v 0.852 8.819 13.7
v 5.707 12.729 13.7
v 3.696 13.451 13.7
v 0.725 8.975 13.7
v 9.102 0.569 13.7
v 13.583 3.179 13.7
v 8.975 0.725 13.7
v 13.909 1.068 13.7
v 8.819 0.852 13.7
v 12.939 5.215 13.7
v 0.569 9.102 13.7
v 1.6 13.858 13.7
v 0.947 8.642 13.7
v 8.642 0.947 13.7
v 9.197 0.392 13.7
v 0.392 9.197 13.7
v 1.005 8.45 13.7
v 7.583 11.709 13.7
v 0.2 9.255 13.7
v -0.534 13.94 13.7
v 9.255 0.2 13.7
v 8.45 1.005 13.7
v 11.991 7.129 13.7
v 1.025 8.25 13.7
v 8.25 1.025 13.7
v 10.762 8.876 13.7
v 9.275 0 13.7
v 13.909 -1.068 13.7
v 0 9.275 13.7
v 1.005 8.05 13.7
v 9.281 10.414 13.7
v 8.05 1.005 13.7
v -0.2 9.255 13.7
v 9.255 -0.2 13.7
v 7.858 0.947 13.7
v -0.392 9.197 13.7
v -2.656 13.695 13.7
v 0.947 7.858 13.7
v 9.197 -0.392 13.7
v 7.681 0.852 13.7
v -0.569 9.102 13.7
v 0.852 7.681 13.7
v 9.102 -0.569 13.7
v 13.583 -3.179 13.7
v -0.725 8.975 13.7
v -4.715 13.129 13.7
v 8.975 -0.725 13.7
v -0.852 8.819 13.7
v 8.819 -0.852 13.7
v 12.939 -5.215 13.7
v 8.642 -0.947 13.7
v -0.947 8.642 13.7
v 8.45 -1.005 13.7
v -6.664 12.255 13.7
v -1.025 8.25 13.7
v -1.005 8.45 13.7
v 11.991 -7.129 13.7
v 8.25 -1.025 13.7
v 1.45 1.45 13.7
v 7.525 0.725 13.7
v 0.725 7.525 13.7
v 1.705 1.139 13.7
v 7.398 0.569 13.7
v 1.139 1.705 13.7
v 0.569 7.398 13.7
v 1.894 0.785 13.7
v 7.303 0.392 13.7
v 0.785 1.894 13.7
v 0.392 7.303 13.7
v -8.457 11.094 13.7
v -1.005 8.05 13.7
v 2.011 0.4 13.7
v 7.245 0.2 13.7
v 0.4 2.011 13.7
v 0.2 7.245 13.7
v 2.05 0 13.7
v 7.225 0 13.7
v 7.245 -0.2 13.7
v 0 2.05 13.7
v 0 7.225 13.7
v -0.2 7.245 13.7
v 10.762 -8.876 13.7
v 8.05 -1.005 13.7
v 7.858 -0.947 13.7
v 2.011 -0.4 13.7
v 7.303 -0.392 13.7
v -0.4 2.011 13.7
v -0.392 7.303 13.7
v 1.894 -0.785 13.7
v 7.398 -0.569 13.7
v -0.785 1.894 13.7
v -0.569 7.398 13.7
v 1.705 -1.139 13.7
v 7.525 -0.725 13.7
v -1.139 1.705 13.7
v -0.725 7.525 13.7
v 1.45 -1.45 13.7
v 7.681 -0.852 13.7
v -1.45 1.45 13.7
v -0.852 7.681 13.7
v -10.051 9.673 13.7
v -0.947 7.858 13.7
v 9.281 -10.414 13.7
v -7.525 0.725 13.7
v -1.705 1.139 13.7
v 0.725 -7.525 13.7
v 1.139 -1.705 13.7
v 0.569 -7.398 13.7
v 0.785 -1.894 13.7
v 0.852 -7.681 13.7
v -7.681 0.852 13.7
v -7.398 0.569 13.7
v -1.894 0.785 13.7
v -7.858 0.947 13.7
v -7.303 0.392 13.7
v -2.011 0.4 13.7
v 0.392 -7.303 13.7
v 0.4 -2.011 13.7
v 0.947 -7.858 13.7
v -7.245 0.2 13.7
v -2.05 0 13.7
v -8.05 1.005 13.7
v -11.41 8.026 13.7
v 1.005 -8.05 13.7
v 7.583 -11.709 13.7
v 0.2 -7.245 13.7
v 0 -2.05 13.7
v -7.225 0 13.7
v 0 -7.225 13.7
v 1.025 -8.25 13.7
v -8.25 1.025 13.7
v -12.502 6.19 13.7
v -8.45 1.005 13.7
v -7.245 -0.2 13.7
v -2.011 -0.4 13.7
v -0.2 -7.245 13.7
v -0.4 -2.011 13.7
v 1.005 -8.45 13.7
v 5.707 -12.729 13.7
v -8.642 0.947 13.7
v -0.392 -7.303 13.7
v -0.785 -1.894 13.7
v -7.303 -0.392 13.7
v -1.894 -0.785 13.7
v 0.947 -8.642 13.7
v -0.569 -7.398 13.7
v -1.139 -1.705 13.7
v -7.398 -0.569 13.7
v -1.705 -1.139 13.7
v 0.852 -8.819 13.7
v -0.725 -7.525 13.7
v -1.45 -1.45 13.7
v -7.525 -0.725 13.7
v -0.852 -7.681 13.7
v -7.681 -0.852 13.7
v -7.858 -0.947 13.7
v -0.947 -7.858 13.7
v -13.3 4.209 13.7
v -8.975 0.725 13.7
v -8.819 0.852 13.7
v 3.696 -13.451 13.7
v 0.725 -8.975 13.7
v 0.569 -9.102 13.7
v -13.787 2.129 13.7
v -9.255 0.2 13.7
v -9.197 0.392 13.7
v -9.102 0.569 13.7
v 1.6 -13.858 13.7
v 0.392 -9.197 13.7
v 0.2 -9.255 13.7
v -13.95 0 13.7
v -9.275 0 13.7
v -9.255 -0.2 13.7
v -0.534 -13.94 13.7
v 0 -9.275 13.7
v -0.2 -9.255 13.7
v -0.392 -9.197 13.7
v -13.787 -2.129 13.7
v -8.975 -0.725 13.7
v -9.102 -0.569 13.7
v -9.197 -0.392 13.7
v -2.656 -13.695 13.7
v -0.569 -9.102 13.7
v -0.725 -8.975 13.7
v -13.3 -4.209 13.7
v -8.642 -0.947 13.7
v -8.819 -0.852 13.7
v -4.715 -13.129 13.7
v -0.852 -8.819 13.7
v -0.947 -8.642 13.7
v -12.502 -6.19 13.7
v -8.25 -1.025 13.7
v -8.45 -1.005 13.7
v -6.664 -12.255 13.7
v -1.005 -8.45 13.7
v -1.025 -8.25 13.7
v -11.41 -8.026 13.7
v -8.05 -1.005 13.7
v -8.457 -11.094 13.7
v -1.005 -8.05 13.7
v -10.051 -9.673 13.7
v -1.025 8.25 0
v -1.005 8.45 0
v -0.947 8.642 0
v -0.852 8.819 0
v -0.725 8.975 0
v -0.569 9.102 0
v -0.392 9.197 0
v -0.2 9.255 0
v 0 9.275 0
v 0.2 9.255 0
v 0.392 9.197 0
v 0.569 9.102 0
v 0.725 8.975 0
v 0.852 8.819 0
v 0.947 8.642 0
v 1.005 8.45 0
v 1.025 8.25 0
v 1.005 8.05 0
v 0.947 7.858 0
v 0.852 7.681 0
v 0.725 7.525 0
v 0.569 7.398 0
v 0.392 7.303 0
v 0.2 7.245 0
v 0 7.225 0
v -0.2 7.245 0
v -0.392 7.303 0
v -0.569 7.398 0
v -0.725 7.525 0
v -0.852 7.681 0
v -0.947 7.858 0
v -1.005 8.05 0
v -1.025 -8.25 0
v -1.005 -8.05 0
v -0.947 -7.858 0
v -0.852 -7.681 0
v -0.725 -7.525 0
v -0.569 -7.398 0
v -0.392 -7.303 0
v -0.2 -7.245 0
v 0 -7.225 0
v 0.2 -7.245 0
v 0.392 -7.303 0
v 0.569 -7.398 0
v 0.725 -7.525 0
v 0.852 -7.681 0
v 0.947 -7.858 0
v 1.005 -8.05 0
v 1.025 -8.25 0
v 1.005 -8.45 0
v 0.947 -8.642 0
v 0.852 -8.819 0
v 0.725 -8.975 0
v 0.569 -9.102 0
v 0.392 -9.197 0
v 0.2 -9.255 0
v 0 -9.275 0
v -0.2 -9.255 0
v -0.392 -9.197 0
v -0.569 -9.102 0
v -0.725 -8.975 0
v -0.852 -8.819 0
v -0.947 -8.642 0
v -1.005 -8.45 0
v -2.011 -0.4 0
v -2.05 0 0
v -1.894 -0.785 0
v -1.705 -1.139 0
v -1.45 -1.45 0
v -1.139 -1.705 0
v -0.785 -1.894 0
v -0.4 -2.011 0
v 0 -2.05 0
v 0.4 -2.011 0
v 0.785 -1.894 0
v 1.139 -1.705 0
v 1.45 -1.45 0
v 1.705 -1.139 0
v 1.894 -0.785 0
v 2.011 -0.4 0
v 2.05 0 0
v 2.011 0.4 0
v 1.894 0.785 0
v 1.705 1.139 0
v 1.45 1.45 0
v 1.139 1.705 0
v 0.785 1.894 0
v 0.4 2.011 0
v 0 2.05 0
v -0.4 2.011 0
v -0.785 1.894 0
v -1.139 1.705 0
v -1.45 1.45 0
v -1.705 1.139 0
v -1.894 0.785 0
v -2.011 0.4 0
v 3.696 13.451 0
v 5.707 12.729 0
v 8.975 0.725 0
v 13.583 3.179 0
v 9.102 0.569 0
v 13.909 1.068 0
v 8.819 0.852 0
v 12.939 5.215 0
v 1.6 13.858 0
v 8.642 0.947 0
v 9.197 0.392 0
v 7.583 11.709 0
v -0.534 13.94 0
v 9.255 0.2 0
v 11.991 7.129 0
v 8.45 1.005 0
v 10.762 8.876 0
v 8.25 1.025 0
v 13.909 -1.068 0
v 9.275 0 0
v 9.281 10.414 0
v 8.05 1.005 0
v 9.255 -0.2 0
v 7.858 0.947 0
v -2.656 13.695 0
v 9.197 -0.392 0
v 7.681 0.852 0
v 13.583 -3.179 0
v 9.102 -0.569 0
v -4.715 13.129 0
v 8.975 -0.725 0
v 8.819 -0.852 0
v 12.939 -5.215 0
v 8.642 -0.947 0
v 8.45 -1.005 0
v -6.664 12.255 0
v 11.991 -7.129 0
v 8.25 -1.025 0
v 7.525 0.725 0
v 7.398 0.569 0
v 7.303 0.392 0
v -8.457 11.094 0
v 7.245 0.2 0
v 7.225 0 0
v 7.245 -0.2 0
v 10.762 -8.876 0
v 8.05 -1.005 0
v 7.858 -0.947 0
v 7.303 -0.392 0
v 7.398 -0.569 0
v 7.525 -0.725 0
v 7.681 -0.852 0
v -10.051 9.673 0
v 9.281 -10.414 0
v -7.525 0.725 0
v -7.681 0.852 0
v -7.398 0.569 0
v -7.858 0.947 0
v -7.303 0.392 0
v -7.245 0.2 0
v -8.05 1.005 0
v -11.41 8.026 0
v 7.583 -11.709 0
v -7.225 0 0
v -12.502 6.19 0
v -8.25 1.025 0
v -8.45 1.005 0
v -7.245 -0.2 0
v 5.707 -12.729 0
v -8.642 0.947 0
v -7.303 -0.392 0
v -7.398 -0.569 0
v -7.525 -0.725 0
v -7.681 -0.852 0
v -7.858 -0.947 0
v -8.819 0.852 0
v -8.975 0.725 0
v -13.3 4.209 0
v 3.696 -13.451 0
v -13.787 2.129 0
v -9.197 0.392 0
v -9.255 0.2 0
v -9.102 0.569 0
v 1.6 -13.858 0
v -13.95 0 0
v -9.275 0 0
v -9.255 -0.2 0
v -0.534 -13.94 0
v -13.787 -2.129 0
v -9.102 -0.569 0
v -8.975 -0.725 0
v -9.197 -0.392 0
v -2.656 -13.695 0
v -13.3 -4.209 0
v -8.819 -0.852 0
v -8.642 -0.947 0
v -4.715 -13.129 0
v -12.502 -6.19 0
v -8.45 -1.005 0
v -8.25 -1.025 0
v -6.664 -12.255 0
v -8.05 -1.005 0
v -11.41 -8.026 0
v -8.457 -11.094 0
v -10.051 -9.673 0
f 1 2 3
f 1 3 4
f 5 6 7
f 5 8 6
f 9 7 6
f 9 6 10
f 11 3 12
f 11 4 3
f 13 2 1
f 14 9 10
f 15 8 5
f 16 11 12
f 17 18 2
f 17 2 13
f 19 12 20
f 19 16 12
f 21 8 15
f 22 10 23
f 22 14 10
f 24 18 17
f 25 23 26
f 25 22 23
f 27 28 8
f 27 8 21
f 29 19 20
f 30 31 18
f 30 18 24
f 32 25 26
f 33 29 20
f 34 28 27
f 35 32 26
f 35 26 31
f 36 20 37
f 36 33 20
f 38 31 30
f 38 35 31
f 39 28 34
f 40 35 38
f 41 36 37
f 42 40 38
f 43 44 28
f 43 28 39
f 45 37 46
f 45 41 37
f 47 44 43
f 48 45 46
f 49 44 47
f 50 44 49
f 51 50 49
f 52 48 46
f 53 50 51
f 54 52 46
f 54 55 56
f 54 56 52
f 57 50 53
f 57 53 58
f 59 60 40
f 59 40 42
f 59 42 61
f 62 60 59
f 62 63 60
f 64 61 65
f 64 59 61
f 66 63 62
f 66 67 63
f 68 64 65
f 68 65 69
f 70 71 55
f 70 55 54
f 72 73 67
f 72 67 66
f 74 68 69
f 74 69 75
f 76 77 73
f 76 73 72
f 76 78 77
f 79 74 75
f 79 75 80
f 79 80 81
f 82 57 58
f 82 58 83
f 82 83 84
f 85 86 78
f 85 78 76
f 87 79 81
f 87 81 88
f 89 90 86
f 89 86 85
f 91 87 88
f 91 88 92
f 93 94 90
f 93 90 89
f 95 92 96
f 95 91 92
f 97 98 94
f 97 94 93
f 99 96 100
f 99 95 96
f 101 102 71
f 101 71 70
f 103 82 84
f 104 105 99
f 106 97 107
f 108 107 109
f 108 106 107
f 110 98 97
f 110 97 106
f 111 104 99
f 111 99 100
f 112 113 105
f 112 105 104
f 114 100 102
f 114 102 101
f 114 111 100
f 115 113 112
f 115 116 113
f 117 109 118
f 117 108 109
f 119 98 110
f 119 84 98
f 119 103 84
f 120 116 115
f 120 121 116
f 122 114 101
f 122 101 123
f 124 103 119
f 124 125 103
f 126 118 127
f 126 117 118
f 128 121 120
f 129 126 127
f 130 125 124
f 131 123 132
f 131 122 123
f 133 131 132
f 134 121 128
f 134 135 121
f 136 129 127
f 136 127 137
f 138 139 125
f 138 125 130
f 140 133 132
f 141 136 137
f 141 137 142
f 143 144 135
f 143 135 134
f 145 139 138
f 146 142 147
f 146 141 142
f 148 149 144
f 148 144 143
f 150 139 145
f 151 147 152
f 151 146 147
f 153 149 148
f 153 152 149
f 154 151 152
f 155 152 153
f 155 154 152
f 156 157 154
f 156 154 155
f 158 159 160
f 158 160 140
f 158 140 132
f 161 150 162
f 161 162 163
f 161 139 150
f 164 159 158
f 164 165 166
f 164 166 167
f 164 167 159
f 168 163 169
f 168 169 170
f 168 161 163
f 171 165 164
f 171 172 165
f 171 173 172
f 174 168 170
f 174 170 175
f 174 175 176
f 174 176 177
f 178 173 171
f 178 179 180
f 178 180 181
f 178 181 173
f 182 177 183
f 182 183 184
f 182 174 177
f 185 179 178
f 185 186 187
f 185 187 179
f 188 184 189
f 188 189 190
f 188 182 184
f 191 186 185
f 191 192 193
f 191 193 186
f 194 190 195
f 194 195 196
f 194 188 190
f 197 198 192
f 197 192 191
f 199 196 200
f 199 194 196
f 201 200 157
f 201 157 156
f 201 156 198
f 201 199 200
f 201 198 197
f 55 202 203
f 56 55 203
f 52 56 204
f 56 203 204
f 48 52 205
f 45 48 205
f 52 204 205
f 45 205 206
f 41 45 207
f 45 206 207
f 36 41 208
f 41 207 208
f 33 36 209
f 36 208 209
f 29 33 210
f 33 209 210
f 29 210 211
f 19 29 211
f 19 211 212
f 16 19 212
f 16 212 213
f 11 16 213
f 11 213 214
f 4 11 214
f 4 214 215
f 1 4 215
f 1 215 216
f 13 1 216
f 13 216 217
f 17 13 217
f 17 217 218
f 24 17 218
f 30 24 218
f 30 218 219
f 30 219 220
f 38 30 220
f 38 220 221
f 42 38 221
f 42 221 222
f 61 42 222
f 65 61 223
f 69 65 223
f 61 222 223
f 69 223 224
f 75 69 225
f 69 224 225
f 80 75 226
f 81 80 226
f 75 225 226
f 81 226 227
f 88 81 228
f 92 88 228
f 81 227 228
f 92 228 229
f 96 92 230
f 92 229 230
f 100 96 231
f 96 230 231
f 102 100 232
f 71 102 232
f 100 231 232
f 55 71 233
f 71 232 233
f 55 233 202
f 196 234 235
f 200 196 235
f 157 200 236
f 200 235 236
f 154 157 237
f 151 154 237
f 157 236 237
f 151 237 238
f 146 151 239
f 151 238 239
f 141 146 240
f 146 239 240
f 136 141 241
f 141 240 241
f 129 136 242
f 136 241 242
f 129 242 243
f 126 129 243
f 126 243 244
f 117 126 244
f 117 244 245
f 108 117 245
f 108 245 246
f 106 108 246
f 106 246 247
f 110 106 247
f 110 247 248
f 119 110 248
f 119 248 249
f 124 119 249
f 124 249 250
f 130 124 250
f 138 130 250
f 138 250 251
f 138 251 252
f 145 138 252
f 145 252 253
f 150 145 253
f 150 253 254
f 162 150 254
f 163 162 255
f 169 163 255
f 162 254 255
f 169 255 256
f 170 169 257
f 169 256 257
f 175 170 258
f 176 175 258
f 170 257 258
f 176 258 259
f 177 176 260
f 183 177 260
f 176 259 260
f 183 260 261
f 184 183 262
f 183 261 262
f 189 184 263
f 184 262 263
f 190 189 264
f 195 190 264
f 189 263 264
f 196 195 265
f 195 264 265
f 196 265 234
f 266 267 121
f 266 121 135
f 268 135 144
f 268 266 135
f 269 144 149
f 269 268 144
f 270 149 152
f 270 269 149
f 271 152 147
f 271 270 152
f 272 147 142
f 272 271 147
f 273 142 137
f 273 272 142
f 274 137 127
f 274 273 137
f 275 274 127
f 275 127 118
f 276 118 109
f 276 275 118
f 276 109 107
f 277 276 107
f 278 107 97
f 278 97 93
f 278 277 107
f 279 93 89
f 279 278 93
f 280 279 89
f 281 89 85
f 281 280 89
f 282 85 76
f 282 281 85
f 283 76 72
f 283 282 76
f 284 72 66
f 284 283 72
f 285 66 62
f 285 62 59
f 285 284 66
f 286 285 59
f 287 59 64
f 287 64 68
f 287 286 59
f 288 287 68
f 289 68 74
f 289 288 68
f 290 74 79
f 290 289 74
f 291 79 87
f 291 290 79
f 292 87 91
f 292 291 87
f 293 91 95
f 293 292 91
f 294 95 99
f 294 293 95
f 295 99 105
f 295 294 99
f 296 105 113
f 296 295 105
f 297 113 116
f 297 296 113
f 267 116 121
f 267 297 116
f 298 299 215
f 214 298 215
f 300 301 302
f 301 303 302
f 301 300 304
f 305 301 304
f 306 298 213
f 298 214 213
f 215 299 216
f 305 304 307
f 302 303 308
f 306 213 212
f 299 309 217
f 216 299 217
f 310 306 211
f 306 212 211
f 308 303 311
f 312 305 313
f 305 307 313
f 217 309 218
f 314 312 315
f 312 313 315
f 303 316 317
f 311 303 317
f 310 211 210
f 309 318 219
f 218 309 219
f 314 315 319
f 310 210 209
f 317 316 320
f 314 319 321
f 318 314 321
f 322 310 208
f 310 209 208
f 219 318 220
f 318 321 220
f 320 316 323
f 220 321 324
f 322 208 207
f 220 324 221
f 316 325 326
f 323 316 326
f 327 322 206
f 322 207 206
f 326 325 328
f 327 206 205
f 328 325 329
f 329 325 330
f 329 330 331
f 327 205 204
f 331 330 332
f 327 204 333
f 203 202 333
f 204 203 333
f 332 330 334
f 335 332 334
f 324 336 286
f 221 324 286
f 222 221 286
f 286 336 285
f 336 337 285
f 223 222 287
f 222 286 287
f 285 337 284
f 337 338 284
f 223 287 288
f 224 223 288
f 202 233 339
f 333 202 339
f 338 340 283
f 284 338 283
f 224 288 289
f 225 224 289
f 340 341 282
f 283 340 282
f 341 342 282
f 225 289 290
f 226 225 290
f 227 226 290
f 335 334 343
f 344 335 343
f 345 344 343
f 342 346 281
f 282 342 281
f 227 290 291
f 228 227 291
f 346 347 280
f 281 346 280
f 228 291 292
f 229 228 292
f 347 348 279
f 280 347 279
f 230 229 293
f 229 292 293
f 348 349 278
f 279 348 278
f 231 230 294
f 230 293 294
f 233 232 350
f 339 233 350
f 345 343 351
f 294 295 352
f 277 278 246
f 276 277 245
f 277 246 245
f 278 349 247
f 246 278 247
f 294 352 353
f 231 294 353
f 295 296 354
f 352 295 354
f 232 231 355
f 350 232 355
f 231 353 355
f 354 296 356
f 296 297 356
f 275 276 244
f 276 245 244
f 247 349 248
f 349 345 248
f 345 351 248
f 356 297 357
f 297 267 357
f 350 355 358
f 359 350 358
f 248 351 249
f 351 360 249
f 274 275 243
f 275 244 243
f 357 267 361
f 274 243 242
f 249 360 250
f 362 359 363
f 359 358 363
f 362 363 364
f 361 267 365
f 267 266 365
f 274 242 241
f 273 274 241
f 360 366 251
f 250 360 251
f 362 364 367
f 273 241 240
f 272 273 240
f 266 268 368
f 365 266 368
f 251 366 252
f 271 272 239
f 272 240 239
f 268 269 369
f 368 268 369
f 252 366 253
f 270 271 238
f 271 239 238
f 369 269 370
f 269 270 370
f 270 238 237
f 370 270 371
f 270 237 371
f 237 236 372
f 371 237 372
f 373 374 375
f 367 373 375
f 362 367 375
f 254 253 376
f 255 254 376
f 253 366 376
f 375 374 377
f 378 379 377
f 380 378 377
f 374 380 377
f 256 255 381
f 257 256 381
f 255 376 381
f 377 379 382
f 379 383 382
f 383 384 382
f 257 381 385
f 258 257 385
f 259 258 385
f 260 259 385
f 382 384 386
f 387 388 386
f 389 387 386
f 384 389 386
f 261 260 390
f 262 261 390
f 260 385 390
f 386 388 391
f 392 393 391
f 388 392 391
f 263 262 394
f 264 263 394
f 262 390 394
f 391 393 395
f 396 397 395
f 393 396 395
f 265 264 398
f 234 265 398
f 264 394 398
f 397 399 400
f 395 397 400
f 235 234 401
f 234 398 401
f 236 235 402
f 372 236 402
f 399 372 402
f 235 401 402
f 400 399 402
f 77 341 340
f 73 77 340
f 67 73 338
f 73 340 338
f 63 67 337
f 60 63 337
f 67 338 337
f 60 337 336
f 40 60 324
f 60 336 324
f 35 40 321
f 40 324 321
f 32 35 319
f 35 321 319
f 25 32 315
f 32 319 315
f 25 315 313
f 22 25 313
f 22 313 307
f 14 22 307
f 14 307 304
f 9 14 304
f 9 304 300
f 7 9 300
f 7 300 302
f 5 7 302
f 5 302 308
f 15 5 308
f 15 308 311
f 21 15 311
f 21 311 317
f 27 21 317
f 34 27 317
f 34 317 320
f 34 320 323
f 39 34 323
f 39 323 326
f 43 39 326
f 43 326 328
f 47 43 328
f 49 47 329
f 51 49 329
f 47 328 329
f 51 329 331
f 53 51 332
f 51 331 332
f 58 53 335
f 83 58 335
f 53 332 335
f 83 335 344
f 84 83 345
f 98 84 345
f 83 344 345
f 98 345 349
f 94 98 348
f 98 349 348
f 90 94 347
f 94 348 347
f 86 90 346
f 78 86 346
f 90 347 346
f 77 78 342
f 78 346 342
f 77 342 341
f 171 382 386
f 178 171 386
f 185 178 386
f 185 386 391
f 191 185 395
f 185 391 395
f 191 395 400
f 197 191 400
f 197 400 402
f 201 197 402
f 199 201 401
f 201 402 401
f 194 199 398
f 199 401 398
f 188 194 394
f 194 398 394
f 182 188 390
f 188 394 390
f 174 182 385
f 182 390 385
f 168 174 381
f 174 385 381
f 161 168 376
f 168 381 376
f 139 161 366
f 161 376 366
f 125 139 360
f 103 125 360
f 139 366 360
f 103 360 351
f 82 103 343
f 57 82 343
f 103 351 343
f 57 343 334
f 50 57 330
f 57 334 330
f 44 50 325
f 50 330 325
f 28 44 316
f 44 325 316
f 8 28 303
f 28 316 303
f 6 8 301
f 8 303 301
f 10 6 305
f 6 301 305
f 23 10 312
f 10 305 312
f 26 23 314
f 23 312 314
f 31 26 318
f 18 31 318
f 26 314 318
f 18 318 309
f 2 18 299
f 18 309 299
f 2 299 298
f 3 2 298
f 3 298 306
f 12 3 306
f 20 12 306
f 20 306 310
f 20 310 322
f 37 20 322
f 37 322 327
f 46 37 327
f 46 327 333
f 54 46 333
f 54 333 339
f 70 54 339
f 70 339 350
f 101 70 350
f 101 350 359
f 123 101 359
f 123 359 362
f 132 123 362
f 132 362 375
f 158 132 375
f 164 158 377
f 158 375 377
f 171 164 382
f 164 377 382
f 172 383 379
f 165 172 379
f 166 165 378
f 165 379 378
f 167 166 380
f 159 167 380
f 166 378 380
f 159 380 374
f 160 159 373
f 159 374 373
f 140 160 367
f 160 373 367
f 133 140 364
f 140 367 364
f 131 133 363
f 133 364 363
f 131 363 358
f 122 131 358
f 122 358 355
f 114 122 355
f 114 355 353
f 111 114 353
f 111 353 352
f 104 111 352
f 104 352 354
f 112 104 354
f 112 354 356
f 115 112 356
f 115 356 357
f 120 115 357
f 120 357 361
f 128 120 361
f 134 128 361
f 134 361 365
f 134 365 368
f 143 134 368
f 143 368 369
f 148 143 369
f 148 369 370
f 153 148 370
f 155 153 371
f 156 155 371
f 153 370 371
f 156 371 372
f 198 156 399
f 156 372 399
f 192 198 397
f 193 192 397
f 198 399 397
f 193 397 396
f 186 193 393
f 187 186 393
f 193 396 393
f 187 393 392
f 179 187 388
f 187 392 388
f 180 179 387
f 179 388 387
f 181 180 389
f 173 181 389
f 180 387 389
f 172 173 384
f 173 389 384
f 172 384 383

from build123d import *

# Parameters (mm, degrees)
SKETCH_1_R           = 13.95
SKETCH_1_R_2         = 2.05
EXTRUDE_1_DEPTH      = 13.7
HOLE_WIZARD_M2_5_1_D = 2.05


with BuildPart() as part:
    # 草图1 → 凸台-拉伸1 (new body)
    with BuildSketch(Plane.XY):
        with Locations(Location((0, 0, 0), (0, 0, 180))):
            Circle(SKETCH_1_R)
        with Locations(Location((0, 0, 0), (0, 0, 180))):
            Circle(SKETCH_1_R_2, mode=Mode.SUBTRACT)
    extrude(amount=EXTRUDE_1_DEPTH)

    # M2.5 螺纹孔1 (through all)
    with Locations(Plane.XY.offset(13.7)):
        with Locations((0, 8.25), (8.25, 0), (0, -8.25), (-8.25, 0)):
            Hole(HOLE_WIZARD_M2_5_1_D / 2)


solid = part.part
